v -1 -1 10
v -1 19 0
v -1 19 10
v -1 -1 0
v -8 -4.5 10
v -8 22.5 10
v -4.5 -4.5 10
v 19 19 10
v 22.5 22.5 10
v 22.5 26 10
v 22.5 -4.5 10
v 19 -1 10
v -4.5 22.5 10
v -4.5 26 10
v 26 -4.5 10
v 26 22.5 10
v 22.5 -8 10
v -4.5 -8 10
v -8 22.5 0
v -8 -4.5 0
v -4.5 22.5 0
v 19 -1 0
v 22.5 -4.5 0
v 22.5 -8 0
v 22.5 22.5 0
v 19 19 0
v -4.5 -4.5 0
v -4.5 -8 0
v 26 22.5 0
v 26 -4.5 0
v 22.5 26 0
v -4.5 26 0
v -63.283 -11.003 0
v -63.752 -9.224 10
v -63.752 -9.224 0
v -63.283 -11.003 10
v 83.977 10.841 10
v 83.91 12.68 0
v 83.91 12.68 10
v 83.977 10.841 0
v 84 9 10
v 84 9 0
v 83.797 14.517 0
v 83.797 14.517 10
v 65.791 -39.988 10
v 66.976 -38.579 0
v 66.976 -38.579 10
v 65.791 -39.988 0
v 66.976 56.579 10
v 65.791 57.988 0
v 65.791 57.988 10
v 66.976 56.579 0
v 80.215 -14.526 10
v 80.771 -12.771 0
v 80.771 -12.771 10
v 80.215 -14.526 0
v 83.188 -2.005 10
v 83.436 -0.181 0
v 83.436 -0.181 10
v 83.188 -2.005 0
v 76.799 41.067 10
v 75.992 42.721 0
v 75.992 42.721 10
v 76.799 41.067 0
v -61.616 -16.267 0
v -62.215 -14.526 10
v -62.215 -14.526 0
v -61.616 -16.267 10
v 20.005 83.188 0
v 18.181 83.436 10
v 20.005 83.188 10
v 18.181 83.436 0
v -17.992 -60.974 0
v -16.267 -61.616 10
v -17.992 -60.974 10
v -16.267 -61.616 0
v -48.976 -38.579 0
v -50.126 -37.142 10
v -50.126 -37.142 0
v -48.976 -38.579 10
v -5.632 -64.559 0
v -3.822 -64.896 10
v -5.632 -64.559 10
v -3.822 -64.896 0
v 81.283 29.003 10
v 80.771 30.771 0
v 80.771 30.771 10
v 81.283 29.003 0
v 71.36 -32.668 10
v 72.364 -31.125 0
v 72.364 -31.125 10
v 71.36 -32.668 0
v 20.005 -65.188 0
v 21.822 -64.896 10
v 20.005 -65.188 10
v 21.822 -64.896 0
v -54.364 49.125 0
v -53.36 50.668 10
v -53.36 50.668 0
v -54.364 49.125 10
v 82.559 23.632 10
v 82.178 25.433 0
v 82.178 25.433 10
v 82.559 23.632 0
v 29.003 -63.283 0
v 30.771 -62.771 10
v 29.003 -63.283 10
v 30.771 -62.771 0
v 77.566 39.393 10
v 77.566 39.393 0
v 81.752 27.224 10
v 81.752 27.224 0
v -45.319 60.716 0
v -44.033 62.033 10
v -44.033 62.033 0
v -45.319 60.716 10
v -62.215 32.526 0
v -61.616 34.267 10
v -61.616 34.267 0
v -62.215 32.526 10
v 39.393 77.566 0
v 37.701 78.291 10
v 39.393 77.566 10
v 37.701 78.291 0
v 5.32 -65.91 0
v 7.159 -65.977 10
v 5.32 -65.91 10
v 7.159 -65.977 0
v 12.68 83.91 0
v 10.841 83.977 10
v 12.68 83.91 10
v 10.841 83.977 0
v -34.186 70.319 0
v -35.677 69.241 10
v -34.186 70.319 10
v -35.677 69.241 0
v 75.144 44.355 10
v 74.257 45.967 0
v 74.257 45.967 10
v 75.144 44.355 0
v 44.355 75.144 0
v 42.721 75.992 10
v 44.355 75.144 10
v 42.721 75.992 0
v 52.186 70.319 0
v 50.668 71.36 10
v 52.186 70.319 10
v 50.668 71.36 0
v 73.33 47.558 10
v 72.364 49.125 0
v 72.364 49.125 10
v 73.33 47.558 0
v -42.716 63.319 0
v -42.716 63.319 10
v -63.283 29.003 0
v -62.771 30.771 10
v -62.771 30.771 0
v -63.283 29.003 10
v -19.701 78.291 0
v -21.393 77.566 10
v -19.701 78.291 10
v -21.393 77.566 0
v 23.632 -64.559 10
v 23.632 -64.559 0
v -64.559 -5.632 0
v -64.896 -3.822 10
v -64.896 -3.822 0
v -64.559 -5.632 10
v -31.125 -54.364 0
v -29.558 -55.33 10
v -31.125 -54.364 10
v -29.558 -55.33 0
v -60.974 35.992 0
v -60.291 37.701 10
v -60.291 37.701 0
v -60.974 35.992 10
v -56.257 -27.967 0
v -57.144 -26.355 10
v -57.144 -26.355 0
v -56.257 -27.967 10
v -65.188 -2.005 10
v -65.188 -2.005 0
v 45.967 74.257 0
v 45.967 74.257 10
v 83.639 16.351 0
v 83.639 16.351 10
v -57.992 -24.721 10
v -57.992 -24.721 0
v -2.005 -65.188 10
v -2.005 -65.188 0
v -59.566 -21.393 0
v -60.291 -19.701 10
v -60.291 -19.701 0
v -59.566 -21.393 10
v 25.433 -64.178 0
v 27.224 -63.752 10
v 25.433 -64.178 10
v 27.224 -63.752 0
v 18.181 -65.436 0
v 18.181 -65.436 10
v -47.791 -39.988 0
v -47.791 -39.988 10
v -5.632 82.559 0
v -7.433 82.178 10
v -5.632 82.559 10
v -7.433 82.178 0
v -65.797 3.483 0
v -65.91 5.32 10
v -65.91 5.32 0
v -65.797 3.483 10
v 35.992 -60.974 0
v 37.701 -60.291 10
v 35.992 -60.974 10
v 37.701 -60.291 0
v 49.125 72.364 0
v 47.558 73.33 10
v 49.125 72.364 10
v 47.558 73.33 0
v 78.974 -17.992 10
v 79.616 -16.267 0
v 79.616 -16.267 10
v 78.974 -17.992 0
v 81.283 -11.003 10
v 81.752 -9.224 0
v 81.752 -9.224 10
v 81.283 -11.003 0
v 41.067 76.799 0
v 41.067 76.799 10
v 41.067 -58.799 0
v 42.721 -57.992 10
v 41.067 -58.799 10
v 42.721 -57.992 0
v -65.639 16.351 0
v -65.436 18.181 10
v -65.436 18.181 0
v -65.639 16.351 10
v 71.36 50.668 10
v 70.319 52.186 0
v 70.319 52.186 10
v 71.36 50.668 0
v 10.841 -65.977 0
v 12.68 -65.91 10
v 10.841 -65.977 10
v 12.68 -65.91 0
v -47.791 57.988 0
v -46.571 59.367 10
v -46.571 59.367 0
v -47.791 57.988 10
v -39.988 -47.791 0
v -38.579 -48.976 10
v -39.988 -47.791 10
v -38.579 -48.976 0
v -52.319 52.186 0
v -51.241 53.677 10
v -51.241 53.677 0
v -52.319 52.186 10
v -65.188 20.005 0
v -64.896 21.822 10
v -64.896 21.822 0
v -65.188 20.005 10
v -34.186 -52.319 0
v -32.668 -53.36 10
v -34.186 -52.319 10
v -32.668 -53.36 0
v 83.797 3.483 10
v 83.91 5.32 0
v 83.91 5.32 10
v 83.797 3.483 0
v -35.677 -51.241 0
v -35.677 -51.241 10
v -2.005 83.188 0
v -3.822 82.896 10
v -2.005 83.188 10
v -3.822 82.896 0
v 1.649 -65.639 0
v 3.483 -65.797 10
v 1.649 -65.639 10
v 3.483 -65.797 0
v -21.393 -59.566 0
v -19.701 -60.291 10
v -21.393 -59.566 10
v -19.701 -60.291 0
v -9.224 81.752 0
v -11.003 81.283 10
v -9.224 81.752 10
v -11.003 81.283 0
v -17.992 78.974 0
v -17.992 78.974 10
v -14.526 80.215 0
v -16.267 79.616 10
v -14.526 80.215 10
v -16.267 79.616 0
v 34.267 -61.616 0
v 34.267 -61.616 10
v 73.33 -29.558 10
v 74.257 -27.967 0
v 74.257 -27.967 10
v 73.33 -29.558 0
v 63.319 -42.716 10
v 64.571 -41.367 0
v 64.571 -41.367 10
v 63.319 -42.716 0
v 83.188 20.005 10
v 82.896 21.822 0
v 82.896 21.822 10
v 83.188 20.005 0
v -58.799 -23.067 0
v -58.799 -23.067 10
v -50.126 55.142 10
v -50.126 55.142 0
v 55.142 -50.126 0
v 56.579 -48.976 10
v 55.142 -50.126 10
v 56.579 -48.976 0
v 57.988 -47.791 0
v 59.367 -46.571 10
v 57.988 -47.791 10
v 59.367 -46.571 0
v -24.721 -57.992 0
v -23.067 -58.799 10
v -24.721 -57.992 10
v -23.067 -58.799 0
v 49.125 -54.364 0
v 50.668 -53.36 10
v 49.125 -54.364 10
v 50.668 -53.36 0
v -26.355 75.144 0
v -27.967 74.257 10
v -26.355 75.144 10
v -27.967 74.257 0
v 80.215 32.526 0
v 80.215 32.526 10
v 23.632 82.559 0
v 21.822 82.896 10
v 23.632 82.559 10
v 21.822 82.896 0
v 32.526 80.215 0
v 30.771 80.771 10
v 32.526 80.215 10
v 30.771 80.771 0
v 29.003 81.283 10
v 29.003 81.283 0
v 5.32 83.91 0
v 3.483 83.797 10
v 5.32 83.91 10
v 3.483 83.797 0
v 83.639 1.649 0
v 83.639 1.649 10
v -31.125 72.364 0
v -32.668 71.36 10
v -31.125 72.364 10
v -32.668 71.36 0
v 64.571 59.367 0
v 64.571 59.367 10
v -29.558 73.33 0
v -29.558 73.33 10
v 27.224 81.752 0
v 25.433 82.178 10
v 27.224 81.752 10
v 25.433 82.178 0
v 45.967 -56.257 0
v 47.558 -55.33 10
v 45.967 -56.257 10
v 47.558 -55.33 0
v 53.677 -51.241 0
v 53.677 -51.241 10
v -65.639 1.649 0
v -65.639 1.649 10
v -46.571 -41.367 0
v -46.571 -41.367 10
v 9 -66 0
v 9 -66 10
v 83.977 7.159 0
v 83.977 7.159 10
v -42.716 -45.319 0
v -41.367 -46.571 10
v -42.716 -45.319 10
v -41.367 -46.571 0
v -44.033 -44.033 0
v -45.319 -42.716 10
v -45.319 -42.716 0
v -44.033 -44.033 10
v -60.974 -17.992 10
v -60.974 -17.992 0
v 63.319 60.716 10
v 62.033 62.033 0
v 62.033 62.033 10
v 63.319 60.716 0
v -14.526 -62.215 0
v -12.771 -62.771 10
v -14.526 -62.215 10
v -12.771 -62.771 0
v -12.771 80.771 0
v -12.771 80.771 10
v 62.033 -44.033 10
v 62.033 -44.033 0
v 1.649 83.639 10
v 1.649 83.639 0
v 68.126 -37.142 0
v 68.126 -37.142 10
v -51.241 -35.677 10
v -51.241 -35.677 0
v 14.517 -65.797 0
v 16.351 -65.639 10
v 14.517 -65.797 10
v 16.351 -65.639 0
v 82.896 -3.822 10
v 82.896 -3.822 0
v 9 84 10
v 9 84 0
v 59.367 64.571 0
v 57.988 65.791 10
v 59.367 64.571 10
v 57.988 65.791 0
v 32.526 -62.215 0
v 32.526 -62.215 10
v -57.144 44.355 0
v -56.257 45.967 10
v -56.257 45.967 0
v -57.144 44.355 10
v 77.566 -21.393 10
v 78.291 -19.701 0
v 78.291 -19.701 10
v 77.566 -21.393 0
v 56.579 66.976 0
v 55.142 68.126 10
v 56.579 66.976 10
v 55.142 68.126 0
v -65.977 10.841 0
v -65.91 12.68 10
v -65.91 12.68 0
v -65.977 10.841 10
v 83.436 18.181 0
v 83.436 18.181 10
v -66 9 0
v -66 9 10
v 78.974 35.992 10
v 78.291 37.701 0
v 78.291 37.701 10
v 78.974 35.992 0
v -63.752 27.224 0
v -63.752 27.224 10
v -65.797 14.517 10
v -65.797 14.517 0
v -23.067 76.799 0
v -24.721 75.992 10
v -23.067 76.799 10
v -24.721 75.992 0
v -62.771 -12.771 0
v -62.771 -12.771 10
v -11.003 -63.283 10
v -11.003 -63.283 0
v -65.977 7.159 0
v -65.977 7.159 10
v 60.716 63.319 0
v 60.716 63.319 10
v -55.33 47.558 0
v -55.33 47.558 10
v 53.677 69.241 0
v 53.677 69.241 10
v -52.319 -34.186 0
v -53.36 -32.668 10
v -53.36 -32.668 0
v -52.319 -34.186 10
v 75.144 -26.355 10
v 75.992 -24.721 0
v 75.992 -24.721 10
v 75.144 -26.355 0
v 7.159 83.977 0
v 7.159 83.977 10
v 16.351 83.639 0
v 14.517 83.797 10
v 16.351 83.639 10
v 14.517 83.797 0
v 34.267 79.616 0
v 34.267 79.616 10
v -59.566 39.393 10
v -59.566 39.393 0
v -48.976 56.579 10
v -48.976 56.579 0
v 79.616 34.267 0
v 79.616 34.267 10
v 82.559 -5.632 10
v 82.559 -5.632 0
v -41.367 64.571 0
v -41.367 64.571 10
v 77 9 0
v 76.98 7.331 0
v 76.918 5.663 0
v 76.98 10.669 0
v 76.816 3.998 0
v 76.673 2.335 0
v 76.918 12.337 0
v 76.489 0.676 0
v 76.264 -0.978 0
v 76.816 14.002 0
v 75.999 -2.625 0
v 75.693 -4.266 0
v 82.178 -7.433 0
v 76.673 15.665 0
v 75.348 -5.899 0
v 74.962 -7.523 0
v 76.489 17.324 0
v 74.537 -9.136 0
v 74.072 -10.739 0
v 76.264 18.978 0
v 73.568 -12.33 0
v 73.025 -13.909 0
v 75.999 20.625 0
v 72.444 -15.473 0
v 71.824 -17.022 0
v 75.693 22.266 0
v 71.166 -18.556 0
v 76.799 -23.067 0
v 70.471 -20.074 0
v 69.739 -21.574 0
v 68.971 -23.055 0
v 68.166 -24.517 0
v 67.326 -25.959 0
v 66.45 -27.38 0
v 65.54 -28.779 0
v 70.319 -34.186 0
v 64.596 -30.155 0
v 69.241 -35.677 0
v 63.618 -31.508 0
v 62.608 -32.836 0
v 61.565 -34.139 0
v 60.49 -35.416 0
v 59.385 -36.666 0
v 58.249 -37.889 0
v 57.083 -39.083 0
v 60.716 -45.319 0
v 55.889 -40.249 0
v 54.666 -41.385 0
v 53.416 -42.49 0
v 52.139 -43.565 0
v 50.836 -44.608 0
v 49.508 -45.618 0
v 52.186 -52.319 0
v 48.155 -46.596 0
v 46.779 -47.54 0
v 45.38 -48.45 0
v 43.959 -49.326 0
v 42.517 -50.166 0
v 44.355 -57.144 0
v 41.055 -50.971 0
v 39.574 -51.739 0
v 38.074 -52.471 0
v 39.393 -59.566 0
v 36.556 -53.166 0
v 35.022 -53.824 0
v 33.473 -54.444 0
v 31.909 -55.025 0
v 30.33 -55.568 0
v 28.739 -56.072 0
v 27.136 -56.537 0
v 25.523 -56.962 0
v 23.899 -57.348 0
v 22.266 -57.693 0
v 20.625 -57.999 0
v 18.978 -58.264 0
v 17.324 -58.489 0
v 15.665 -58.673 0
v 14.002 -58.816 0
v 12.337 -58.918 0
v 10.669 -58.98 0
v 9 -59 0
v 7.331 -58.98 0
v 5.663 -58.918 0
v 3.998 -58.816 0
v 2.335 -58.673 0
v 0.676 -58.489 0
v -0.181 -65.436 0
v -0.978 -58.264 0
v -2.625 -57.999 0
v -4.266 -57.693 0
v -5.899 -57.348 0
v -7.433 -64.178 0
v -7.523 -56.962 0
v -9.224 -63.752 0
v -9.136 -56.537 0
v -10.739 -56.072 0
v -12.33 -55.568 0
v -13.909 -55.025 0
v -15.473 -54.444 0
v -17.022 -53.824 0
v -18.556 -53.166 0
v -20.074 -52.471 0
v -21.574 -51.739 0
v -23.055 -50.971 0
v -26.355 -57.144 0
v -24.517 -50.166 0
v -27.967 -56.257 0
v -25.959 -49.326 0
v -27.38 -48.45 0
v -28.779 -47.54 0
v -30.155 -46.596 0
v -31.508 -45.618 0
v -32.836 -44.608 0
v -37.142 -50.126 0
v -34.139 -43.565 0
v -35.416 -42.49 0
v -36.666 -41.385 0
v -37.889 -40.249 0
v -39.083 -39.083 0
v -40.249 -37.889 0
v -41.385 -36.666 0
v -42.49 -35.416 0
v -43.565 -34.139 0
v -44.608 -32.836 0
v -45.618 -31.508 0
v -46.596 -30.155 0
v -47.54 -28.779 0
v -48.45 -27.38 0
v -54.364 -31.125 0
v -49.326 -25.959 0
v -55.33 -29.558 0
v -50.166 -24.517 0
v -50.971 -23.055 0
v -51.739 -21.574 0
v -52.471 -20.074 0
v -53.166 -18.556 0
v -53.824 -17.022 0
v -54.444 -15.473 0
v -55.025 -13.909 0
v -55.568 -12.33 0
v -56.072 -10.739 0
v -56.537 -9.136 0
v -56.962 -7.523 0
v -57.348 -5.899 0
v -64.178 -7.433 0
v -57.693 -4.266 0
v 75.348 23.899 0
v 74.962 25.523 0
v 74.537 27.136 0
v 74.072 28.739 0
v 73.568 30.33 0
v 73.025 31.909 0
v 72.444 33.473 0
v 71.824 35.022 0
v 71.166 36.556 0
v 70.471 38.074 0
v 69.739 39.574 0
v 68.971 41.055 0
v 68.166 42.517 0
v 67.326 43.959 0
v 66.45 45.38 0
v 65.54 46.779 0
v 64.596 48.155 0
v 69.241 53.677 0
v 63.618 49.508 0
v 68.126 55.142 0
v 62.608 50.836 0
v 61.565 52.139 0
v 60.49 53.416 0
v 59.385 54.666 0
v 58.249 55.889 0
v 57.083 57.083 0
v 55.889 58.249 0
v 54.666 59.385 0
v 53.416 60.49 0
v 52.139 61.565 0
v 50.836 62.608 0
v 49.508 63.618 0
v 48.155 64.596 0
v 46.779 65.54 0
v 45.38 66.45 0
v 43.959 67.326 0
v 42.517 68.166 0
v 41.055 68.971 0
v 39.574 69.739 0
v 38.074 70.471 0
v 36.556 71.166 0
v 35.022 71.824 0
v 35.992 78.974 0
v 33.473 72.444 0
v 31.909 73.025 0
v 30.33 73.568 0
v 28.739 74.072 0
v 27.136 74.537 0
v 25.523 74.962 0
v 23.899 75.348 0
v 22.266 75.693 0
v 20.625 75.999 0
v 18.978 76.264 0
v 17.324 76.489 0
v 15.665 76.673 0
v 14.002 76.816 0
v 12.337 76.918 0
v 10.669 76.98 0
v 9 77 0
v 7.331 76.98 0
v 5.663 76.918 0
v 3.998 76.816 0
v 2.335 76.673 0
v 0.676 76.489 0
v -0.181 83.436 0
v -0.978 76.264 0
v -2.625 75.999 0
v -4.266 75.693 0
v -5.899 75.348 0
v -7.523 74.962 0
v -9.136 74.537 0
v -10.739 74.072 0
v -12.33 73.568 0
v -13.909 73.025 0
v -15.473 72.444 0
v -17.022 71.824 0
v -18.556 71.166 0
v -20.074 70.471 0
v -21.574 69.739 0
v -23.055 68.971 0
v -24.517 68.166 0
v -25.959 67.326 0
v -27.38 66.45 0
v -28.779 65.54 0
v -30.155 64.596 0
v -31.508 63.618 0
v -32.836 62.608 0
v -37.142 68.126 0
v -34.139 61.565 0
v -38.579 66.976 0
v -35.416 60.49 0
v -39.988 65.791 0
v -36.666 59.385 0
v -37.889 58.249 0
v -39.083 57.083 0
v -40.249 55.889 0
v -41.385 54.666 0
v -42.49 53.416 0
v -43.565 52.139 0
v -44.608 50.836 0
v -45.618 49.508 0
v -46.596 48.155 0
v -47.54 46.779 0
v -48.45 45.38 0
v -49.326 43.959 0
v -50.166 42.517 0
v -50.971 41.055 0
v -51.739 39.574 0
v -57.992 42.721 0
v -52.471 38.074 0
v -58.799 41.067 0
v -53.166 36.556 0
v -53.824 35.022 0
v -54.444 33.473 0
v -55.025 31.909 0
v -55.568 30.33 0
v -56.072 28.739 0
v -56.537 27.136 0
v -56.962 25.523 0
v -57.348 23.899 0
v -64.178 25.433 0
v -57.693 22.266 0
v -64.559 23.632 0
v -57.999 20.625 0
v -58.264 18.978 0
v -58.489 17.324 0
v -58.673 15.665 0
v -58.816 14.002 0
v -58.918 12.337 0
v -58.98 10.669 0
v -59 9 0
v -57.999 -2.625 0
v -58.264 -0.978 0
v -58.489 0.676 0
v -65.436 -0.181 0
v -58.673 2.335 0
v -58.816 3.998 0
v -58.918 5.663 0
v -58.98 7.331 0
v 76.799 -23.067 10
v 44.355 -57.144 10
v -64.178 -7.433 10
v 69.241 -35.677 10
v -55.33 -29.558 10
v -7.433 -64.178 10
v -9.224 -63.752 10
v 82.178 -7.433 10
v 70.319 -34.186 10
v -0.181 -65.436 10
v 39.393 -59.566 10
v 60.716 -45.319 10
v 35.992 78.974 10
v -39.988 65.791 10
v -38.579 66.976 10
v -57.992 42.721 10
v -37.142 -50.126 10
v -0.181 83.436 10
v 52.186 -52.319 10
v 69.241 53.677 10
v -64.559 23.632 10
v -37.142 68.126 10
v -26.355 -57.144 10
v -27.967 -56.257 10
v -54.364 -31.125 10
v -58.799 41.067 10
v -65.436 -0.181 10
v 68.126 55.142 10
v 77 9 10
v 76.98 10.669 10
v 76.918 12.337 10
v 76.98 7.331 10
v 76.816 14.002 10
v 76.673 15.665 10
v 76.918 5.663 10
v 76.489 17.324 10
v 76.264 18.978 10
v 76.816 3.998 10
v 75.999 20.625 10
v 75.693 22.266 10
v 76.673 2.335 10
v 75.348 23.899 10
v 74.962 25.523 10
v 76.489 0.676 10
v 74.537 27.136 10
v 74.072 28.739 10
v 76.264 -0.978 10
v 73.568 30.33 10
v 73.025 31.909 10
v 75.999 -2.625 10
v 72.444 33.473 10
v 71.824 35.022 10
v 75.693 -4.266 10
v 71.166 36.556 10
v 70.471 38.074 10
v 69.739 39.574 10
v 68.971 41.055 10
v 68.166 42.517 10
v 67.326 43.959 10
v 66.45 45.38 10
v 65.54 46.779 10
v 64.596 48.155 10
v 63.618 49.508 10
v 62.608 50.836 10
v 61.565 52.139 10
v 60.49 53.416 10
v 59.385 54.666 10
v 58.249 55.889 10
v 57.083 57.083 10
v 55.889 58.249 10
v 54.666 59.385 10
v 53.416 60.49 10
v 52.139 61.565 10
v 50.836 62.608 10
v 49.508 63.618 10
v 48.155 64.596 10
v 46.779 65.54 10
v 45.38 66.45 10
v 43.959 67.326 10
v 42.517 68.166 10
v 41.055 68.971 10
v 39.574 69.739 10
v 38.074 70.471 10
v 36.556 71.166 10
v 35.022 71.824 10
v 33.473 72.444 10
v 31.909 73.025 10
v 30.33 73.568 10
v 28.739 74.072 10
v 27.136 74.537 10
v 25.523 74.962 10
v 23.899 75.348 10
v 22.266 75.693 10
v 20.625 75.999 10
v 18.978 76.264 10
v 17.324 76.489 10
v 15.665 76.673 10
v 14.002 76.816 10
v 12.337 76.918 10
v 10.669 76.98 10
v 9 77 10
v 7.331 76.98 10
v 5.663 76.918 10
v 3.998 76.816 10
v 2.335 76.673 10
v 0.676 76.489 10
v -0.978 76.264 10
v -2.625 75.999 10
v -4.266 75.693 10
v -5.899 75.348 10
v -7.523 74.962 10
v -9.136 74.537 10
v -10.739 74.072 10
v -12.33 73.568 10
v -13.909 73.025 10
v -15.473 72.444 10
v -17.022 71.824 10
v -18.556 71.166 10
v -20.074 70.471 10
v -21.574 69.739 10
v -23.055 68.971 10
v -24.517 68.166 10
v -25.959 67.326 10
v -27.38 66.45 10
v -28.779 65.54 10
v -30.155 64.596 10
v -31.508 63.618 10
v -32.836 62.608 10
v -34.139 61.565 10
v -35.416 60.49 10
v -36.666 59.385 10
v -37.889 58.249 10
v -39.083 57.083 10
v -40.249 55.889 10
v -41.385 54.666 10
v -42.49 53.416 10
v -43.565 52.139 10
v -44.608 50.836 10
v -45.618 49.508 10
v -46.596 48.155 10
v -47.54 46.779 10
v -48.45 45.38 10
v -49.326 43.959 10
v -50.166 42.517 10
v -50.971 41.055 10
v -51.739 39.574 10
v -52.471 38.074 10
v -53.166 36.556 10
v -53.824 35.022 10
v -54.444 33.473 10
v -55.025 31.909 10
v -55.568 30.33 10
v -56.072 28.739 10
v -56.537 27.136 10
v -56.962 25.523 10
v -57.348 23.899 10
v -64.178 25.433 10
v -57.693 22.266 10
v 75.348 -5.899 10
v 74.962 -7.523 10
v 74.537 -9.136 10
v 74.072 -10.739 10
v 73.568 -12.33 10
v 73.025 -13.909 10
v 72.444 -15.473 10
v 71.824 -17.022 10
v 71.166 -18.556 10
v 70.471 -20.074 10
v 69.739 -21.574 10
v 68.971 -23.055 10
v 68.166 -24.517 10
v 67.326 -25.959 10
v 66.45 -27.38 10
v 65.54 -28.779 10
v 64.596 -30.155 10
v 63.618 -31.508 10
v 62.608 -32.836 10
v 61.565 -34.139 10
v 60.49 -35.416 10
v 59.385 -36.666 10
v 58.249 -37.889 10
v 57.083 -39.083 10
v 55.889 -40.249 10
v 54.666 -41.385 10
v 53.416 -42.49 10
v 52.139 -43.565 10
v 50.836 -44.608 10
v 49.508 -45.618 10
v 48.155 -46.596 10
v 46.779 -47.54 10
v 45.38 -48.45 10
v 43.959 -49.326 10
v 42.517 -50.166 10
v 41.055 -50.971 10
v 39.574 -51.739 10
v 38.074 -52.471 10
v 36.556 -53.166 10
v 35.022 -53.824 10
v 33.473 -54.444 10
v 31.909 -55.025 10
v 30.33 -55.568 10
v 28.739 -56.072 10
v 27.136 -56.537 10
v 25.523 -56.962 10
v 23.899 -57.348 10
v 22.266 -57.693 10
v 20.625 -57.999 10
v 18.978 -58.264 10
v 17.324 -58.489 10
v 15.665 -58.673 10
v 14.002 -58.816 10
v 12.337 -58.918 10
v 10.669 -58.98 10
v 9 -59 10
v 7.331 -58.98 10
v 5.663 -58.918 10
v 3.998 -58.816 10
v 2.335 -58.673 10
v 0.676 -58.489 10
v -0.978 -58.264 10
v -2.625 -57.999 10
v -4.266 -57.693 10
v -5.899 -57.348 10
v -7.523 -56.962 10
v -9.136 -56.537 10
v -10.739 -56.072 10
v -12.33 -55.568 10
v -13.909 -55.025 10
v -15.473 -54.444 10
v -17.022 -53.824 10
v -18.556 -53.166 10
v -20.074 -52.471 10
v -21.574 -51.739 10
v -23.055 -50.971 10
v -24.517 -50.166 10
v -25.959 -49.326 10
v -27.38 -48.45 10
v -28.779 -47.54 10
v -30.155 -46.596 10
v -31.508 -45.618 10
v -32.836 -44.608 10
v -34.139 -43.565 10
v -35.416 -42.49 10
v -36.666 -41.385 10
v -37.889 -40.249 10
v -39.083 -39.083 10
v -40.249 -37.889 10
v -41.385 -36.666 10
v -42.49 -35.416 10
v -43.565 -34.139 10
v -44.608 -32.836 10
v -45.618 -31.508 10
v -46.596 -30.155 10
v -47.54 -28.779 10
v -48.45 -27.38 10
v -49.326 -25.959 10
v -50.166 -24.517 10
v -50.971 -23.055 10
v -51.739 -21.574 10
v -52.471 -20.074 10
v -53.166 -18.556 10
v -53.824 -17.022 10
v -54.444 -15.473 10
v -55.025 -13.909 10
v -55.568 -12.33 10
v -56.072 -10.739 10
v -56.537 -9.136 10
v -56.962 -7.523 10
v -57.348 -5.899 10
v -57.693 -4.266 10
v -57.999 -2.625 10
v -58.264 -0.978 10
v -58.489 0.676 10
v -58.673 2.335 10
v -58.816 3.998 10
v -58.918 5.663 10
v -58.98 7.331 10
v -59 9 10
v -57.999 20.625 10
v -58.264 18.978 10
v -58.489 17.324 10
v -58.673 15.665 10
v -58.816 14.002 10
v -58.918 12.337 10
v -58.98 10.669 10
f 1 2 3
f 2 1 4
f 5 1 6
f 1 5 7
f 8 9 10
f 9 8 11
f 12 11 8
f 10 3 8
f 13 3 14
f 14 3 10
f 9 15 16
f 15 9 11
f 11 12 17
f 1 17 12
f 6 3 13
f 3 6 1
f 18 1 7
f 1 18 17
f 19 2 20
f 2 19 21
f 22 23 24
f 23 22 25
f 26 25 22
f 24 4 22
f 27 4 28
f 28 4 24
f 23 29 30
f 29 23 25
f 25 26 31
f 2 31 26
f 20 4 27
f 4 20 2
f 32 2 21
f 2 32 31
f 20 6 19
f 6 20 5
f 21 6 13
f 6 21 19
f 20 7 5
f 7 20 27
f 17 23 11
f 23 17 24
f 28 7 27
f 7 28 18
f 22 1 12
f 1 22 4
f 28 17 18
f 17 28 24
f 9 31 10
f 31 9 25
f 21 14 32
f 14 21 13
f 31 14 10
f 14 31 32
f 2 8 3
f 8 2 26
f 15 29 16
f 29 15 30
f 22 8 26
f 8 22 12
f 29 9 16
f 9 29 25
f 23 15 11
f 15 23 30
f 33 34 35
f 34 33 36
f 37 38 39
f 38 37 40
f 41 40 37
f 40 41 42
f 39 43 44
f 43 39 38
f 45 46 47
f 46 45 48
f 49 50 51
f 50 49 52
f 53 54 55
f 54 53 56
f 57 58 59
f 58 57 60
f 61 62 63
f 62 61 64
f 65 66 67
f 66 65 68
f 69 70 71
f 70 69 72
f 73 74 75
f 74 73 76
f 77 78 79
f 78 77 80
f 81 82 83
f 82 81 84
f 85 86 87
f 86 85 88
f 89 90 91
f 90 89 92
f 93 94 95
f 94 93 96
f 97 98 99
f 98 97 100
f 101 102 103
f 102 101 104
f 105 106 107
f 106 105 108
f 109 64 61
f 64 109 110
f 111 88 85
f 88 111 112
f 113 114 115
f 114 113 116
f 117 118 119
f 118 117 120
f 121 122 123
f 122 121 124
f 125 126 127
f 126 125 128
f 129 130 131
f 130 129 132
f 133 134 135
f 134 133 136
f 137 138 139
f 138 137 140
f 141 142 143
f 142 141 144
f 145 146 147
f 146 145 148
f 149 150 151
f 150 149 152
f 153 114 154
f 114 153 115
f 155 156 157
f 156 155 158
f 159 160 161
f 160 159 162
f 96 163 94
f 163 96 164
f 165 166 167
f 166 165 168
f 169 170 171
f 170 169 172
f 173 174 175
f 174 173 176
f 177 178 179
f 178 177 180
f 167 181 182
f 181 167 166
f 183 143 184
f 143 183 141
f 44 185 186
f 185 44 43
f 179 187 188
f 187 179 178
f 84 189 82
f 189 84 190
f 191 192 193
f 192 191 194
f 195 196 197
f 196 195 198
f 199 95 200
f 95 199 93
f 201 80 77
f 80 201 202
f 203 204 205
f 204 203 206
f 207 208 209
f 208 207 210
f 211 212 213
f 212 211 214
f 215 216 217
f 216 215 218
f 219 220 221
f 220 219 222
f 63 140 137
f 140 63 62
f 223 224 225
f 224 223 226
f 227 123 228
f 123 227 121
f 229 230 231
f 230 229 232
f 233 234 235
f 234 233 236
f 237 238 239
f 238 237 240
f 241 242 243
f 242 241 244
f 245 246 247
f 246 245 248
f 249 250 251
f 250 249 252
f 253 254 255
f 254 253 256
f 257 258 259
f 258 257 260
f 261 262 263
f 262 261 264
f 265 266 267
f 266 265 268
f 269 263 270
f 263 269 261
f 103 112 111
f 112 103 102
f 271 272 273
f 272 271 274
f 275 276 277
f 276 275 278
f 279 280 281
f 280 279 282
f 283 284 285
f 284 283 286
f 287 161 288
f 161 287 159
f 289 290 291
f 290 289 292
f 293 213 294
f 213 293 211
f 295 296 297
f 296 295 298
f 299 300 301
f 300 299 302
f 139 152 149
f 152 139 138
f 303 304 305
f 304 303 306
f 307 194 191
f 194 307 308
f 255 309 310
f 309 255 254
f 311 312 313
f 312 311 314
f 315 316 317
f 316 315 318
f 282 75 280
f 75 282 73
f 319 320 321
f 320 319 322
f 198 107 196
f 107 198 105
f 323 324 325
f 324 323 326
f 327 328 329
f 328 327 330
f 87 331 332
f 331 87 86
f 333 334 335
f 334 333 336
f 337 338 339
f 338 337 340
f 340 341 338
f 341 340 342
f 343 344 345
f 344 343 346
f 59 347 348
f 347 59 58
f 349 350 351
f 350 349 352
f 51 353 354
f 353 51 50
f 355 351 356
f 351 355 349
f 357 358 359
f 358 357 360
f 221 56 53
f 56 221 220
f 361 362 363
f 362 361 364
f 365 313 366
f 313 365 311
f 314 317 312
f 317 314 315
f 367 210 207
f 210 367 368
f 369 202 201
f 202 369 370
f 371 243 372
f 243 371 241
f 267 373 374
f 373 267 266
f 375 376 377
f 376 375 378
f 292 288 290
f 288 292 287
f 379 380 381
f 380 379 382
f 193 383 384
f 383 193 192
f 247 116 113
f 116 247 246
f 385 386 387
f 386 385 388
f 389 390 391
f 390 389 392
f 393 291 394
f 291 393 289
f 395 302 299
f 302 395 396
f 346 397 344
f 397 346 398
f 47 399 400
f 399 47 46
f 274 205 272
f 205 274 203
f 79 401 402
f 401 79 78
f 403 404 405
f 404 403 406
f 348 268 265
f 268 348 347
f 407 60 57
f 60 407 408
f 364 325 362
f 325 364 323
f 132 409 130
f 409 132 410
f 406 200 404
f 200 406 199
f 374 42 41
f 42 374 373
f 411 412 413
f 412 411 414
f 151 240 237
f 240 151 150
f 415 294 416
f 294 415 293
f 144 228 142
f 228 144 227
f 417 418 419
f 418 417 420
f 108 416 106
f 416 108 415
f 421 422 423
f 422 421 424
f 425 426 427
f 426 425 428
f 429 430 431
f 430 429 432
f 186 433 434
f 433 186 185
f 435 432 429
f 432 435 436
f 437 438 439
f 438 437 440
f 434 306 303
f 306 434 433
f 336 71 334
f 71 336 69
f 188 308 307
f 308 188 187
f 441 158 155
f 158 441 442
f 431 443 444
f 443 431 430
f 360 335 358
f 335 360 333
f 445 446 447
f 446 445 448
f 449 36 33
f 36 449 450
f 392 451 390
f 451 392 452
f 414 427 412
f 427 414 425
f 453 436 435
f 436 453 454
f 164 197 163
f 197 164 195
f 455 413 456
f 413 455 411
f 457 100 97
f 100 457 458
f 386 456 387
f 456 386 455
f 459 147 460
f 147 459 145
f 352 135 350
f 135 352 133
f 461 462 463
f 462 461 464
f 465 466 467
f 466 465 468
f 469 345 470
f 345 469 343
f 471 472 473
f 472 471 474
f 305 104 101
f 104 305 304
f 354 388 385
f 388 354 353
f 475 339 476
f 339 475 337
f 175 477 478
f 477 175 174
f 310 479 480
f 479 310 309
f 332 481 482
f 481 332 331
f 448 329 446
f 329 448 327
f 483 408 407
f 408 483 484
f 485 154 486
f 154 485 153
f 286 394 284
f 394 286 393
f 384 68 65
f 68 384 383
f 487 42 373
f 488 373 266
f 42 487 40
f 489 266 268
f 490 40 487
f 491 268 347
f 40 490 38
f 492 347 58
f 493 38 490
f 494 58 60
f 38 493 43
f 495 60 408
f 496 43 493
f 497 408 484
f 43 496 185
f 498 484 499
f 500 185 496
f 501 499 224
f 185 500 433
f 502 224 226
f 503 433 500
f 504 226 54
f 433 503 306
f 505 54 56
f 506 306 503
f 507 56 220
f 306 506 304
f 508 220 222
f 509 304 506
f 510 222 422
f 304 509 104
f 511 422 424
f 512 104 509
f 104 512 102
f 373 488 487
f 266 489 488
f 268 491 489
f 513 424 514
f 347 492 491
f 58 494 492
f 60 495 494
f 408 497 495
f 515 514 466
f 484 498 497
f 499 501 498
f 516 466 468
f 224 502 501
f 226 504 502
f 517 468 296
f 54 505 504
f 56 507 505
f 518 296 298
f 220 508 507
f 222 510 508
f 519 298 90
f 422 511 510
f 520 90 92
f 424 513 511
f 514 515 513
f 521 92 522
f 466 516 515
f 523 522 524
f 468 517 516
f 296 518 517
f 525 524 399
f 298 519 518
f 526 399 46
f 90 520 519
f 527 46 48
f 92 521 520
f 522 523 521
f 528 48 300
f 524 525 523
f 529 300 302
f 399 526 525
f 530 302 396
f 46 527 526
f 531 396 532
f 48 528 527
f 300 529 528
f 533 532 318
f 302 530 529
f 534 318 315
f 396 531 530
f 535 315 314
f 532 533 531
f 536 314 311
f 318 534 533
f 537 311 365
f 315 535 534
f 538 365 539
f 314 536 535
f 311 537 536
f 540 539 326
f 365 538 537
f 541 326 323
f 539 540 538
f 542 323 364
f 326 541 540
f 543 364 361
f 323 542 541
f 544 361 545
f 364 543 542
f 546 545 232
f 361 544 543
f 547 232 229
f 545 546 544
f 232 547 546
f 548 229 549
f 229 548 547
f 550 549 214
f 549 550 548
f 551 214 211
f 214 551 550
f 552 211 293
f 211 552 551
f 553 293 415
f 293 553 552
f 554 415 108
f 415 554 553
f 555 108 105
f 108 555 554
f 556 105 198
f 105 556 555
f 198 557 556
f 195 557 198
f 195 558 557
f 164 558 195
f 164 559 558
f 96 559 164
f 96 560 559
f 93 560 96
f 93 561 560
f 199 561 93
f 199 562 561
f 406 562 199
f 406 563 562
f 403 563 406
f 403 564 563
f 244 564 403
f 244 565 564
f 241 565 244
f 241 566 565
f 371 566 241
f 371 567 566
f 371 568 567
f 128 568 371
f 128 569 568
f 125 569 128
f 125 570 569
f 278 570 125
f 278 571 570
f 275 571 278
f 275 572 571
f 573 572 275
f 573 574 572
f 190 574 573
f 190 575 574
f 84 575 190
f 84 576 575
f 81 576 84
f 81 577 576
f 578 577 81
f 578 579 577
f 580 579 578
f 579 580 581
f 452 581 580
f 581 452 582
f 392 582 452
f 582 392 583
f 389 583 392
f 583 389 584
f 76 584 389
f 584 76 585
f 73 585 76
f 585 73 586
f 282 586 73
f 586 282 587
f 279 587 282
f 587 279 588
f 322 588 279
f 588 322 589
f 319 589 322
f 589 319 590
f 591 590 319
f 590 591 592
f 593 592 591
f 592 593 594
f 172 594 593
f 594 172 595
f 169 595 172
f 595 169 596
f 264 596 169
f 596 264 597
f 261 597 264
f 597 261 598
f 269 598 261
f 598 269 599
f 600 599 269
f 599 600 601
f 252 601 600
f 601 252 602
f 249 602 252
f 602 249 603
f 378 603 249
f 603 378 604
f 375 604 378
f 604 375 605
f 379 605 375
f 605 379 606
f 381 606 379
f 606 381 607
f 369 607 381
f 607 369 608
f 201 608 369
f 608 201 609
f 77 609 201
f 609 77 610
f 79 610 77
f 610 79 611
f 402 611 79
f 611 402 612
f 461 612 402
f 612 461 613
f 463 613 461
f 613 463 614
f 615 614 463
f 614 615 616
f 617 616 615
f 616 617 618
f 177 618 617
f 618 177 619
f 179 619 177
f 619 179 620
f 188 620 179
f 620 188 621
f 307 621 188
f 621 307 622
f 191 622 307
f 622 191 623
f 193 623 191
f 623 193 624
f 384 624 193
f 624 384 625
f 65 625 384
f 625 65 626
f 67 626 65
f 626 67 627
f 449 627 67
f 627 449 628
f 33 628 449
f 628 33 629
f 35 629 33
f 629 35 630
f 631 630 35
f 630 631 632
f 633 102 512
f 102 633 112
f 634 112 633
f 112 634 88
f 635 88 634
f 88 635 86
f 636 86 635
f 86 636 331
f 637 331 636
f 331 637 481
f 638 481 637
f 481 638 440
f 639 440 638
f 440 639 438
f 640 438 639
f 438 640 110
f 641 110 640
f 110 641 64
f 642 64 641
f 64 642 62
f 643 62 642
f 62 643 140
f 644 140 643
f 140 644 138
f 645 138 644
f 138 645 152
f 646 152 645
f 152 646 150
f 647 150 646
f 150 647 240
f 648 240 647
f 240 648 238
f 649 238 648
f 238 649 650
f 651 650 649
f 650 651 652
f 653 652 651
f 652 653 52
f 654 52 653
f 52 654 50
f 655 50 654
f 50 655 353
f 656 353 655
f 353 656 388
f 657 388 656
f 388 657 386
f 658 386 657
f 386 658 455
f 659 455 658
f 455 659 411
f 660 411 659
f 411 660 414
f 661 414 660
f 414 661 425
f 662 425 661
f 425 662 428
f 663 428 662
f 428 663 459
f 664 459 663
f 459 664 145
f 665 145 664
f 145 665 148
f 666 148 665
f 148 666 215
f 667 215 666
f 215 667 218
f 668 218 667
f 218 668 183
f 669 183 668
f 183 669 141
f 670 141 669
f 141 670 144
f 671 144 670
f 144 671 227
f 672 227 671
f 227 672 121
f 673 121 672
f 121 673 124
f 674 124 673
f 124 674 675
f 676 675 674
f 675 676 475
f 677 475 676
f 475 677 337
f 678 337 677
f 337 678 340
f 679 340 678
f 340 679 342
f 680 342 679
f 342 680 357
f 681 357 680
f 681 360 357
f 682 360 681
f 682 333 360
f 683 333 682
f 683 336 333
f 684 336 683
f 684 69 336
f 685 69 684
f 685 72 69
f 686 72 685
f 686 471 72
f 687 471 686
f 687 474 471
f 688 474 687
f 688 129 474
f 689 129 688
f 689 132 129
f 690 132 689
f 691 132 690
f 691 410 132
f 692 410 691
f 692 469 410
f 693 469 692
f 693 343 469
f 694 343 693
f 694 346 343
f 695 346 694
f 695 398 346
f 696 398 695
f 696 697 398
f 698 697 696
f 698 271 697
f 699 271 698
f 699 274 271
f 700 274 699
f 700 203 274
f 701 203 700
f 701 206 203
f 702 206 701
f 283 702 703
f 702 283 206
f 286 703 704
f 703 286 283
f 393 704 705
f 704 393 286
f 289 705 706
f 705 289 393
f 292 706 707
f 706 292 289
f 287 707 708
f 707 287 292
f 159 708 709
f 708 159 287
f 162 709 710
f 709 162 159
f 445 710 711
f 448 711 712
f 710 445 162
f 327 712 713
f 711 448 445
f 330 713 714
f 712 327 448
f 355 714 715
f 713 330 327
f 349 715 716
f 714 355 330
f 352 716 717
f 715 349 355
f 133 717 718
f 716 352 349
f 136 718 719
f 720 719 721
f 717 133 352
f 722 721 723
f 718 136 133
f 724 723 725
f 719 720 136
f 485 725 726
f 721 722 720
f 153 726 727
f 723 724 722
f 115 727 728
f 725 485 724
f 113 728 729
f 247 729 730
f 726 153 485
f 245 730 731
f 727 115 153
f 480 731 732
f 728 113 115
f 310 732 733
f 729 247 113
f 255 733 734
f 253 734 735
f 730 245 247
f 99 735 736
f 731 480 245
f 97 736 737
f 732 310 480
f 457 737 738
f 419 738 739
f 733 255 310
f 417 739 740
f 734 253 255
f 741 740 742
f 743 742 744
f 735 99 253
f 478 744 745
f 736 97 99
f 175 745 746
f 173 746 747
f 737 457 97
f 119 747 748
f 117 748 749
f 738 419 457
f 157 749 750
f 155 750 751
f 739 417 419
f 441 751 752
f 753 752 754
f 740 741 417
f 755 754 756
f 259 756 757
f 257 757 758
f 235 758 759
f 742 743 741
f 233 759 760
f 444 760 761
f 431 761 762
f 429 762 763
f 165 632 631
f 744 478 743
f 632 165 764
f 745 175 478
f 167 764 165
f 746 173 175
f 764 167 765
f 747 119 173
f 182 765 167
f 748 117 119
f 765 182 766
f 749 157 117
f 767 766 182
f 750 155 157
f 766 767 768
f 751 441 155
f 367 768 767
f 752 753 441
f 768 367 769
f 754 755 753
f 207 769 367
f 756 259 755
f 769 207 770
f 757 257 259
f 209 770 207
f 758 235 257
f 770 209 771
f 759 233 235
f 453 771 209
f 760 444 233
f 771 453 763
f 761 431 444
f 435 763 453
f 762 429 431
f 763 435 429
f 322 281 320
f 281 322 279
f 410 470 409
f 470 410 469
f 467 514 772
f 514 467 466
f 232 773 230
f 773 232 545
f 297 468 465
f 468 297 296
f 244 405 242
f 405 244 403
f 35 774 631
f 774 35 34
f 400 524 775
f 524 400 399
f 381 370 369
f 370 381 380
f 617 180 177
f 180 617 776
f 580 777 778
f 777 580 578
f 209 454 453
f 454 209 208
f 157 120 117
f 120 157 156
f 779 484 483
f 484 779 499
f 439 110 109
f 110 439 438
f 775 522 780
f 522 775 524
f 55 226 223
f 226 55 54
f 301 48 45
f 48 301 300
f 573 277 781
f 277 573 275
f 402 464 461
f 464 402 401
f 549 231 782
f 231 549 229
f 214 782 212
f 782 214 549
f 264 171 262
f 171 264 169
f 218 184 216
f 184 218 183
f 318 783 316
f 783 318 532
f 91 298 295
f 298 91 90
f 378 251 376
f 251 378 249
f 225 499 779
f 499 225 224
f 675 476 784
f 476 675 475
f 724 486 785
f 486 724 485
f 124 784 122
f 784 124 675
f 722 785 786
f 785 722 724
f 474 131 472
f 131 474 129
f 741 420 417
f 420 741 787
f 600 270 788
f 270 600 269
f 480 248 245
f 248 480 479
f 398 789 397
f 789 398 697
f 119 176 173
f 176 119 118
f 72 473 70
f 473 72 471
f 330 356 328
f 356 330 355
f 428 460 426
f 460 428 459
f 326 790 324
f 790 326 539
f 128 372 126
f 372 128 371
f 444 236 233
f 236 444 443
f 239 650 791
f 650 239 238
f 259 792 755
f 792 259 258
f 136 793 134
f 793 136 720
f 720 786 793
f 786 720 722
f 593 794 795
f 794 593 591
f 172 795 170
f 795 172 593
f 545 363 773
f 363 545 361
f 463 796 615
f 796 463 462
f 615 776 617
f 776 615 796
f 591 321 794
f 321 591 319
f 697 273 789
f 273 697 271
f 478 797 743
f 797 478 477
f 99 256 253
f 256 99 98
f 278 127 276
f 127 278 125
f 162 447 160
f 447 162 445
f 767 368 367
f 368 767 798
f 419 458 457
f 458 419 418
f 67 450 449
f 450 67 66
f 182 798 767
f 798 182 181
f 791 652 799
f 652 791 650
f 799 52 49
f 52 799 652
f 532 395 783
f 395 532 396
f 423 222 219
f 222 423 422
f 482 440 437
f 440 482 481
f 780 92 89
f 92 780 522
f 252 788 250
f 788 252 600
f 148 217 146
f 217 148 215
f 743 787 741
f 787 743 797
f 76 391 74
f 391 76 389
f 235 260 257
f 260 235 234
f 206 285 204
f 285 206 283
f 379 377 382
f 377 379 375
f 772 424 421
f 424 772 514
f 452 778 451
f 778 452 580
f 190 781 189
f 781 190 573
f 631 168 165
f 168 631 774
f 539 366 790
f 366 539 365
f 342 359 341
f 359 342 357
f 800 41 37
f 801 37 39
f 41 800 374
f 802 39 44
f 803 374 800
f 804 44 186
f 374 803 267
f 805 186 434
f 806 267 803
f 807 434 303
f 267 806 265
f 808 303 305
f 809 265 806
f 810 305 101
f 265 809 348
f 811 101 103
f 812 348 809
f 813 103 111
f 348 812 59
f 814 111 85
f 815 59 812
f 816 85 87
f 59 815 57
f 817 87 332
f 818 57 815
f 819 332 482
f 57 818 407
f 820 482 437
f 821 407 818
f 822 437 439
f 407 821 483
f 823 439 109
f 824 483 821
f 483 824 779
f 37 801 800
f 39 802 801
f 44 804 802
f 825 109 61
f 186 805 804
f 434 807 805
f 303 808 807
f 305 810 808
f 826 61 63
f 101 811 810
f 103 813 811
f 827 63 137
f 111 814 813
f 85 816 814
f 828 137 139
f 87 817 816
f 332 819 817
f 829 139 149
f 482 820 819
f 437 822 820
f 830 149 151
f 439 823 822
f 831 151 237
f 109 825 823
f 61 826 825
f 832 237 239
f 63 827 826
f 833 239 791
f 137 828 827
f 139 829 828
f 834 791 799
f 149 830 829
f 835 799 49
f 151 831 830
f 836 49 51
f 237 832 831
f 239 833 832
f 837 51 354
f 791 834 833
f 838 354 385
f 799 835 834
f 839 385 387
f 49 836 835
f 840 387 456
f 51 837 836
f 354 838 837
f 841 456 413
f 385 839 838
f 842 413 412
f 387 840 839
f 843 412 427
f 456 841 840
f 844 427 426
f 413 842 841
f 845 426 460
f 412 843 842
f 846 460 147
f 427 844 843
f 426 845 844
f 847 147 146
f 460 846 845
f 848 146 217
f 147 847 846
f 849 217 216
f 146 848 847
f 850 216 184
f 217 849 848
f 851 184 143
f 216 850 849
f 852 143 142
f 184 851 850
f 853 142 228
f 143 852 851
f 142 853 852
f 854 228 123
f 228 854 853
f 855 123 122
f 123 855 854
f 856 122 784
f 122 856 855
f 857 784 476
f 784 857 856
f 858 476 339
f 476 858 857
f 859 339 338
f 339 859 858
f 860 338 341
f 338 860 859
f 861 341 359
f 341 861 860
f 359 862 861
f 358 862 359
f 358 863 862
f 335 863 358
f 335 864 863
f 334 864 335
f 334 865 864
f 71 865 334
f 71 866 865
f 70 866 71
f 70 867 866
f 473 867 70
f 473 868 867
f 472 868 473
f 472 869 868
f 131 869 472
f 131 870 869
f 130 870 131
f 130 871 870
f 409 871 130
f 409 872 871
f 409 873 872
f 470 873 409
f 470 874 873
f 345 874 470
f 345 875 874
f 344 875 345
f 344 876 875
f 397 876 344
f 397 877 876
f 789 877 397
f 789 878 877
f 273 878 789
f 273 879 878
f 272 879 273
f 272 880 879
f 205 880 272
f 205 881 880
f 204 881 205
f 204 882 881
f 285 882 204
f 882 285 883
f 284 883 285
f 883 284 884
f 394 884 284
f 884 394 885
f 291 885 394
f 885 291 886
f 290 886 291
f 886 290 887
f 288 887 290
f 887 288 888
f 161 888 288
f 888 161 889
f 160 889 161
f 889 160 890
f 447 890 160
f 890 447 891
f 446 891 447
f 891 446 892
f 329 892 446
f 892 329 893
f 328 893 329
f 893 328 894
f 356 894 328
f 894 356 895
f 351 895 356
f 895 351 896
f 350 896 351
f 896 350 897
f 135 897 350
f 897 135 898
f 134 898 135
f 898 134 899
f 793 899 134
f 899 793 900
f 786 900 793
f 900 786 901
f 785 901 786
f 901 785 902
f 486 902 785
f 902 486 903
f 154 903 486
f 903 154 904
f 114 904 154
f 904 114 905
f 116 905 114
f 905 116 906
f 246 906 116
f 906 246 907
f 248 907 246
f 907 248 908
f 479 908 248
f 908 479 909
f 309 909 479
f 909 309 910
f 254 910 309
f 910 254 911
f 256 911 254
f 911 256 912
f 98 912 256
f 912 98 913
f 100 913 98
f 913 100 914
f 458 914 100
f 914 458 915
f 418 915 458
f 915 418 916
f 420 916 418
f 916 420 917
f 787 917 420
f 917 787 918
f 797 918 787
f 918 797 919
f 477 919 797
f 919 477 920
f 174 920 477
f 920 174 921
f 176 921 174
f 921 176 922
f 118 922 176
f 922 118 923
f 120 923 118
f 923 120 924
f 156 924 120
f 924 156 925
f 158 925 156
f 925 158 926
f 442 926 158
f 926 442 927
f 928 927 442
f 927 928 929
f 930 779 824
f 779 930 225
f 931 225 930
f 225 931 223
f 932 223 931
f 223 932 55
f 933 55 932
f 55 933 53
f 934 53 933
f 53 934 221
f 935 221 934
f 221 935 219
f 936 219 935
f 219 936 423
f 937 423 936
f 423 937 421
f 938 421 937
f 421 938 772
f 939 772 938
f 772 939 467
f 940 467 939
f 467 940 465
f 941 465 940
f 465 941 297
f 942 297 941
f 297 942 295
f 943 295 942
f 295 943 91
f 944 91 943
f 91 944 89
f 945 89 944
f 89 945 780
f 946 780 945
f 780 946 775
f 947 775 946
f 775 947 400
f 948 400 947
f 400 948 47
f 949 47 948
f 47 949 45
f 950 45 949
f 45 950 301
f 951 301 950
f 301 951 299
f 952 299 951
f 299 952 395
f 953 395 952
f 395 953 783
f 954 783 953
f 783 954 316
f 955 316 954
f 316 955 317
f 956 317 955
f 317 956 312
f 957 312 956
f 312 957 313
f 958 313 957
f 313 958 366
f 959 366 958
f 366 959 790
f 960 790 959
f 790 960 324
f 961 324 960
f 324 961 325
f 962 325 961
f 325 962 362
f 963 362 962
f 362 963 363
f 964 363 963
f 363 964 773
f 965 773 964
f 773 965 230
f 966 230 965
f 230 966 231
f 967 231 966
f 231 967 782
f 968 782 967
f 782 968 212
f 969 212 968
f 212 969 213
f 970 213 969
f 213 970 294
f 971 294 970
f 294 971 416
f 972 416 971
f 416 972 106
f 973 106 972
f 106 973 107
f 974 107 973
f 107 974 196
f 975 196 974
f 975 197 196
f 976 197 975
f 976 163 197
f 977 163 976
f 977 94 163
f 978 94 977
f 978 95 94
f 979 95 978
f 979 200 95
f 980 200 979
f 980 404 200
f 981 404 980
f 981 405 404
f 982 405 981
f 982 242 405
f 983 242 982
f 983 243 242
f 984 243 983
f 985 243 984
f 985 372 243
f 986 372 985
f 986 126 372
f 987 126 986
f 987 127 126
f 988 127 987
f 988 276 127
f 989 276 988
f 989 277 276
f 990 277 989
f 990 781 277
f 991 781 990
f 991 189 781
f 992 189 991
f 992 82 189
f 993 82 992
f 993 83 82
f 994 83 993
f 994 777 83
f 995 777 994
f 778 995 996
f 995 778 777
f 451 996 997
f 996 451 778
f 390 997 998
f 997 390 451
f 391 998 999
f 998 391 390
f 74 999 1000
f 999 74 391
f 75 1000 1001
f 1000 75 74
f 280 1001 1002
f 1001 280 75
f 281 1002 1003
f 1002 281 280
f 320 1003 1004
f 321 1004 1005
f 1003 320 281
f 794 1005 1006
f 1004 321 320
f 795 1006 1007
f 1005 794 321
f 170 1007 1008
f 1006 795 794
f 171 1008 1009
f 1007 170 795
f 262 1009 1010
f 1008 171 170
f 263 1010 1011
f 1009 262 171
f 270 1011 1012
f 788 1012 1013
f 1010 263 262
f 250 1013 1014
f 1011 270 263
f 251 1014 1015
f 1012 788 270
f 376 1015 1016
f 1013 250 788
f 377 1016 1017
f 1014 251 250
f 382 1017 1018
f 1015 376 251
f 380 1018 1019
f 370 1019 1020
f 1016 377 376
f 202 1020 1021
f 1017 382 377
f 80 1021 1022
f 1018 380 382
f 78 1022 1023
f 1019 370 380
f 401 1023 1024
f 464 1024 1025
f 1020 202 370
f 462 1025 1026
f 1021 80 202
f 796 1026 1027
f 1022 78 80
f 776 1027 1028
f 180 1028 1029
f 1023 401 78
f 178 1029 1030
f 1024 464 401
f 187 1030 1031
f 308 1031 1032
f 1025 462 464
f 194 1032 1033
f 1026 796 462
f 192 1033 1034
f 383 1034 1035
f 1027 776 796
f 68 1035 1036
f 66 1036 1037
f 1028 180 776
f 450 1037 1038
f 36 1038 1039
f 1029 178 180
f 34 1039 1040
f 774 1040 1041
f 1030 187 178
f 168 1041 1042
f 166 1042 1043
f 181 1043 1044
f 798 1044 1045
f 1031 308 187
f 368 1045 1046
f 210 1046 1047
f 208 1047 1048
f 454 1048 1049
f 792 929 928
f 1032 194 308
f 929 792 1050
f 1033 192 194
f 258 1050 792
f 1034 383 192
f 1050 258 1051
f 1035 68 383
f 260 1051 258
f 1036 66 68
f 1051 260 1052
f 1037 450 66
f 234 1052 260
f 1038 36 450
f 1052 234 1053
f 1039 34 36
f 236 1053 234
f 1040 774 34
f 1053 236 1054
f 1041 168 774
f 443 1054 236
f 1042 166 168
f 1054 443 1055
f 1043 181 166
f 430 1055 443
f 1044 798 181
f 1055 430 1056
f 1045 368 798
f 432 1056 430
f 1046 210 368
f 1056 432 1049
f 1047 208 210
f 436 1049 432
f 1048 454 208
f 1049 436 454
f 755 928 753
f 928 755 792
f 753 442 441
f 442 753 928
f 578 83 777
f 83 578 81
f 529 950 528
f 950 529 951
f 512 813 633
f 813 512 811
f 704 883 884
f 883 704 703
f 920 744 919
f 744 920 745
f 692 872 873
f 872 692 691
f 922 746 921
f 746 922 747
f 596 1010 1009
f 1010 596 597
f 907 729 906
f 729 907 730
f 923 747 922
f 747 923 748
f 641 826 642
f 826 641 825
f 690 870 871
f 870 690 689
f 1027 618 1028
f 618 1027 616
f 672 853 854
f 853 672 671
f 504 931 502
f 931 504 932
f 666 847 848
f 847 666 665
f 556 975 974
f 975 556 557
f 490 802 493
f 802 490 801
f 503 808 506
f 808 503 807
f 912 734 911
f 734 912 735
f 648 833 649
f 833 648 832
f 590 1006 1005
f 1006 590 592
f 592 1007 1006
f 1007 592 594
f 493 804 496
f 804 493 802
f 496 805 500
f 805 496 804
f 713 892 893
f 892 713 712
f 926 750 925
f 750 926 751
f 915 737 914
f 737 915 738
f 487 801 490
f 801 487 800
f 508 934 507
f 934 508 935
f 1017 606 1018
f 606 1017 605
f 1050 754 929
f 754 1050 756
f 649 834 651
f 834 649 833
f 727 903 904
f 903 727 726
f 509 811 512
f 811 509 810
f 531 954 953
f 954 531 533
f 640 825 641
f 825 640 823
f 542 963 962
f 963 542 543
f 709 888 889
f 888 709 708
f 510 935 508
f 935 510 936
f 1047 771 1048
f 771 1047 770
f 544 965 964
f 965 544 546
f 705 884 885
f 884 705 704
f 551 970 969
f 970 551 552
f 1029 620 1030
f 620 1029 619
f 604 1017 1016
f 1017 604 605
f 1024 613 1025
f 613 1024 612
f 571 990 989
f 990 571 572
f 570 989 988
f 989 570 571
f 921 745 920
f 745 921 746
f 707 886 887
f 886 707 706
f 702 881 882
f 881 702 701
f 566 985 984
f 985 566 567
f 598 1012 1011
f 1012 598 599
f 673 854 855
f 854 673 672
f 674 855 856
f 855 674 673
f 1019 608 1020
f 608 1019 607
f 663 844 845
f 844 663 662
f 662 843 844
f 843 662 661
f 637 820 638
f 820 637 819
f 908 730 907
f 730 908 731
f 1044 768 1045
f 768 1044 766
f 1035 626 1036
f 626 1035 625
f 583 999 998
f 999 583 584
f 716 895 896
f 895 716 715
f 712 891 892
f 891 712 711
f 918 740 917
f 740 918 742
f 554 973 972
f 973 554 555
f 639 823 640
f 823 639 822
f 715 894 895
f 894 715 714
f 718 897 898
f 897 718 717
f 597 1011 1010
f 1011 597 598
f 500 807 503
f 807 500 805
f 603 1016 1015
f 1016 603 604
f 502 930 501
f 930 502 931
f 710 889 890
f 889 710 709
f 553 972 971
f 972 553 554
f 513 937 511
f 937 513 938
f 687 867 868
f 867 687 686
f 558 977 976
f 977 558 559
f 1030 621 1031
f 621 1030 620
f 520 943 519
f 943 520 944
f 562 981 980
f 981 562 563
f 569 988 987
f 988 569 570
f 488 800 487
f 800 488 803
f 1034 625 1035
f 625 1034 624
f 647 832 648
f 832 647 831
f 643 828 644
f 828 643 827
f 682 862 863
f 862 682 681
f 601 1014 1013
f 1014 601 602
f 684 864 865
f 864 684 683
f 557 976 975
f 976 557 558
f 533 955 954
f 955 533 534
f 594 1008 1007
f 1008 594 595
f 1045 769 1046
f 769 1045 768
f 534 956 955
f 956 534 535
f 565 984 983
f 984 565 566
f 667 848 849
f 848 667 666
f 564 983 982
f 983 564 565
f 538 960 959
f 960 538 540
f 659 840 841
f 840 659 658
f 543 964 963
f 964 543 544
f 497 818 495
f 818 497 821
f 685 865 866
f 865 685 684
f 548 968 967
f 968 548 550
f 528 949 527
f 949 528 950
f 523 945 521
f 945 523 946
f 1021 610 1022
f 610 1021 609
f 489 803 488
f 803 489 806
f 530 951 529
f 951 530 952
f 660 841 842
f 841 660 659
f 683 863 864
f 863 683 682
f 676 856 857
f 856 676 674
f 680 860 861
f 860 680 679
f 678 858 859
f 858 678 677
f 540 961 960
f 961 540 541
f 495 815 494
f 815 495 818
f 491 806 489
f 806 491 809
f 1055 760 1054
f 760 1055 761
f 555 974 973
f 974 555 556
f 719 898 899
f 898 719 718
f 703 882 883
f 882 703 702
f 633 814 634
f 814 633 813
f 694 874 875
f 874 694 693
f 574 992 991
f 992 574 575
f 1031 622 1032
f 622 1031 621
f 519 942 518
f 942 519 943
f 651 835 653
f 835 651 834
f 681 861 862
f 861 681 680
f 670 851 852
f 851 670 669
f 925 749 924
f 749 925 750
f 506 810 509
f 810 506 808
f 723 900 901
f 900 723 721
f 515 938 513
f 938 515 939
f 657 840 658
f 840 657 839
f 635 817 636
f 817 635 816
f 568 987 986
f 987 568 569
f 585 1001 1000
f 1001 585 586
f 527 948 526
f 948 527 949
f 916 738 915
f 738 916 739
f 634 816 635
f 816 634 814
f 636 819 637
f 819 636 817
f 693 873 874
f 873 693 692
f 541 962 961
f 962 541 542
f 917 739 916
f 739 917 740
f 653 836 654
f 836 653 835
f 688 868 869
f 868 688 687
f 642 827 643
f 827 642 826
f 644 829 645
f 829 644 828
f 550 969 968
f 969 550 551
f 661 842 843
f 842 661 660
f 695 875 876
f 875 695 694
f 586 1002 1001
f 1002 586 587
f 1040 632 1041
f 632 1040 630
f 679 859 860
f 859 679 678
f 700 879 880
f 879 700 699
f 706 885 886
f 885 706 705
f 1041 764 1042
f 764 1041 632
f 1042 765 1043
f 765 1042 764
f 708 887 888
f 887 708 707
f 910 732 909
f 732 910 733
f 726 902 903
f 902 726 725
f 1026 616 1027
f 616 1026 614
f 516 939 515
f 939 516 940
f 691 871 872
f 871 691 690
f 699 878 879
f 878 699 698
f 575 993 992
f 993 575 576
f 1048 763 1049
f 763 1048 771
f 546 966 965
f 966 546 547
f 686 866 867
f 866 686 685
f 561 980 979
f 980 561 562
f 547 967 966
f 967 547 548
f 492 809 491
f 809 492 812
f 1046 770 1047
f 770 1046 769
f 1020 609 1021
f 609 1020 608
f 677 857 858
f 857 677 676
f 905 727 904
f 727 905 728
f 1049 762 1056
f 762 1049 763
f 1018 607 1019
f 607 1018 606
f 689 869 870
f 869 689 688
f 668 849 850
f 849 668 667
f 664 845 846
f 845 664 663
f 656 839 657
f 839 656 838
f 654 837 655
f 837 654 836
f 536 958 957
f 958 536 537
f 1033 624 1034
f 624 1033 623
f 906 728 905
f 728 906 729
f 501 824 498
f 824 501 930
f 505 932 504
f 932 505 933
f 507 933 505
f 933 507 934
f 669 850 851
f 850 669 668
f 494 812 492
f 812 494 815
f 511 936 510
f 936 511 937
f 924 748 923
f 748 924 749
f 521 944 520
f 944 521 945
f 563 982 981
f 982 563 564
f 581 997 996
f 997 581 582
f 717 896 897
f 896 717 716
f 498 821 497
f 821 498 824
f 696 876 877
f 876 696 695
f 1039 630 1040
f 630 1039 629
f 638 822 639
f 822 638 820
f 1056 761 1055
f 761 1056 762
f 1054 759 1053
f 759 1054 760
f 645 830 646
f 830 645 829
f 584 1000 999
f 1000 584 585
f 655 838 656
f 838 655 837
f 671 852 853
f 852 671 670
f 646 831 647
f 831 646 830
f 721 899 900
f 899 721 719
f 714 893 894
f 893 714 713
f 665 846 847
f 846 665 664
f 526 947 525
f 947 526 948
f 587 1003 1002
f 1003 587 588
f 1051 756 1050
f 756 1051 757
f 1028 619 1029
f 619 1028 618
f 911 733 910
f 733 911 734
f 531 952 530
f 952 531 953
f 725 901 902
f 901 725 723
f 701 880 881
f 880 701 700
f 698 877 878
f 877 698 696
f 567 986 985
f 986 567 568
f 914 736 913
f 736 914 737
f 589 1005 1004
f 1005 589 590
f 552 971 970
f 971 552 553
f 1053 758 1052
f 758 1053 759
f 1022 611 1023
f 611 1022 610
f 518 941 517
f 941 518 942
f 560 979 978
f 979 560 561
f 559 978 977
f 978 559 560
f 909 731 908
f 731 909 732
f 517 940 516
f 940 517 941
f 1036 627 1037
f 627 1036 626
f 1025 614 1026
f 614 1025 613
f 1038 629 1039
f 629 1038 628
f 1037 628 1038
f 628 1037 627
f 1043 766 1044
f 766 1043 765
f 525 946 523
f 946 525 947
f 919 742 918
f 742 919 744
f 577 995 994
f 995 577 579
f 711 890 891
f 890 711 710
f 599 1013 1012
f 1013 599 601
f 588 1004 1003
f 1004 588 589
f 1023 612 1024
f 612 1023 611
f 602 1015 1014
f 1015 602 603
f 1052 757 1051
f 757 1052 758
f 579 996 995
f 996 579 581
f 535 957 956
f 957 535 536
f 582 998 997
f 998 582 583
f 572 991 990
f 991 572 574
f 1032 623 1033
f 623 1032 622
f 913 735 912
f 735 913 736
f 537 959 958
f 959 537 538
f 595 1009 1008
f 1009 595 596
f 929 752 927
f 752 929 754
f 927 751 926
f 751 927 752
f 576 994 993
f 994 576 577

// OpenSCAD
// Generated by SolidPython 1.1.3 on 2026-06-23 12:54:52


union() {
	union() {
		translate(v = [-4.5000000000, 9.0000000000, 5.0000000000]) {
			cube(center = true, size = [7, 27, 10]);
		}
		translate(v = [9.0000000000, -4.5000000000, 5.0000000000]) {
			cube(center = true, size = [27, 7, 10]);
		}
		translate(v = [0, 27]) {
			translate(v = [9.0000000000, -4.5000000000, 5.0000000000]) {
				cube(center = true, size = [27, 7, 10]);
			}
		}
		translate(v = [27, 0]) {
			translate(v = [-4.5000000000, 9.0000000000, 5.0000000000]) {
				cube(center = true, size = [7, 27, 10]);
			}
		}
	}
	translate(v = [9.0000000000, 9.0000000000]) {
		difference() {
			cylinder($fn = 256, h = 10, r = 75.0000000000);
			cylinder($fn = 256, h = 10, r = 68.0000000000);
		}
	}
}
/***********************************************
*********      SolidPython code:      **********
************************************************

"""SCAD file export functions.

This module provides functions for exporting OpenSCAD geometries to .scad files.
"""

from typing import Dict, Optional
from pathlib import Path
import solid

from .config import ExportConfiguration, FileNamingConfig


def export_scad(
    geometry: solid.OpenSCADObject, output_path: Path, header: Optional[str] = None
) -> Path:
    """Export geometry to SCAD file.

    Parameters
    ----------
    geometry : solid.OpenSCADObject
        Geometry to export.
    output_path : Path
        Output file path.
    header : str, optional
        Header comment to add to SCAD file.

    Returns
    -------
    Path
        Path to created SCAD file.

    Raises
    ------
    IOError
        If file cannot be written.

    Examples
    --------
    >>> from pathlib import Path
    >>> import solid
    >>>
    >>> geometry = solid.cube([10, 10, 10])
    >>> output_path = Path('output/device.scad')
    >>> export_scad(geometry, output_path)
    """
    # Ensure parent directory exists
    output_path.parent.mkdir(parents=True, exist_ok=True)

    # Render to file
    try:
        solid.scad_render_to_file(geometry, str(output_path))
    except Exception as e:
        raise IOError(f"Failed to write SCAD file to {output_path}: {e}")

    _normalize_scad_file(output_path)

    # Add header if provided
    if header:
        _add_header_to_scad(output_path, header)
        _normalize_scad_file(output_path)

    return output_path


def _normalize_scad_file(scad_path: Path) -> None:
    """Strip trailing whitespace from generated SCAD text."""
    content = scad_path.read_text()
    normalized = "\n".join(line.rstrip() for line in content.splitlines()) + "\n"
    if normalized != content:
        scad_path.write_text(normalized)


def export_multiple_scad(
    geometries: Dict[str, solid.OpenSCADObject],
    config: ExportConfiguration,
    naming_config: Optional[FileNamingConfig] = None,
) -> Dict[str, Path]:
    """Export multiple geometries to SCAD files.

    Parameters
    ----------
    geometries : dict
        Dictionary mapping prefixes to geometries.
        Keys are used as filename prefixes.
    config : ExportConfiguration
        Export configuration.
    naming_config : FileNamingConfig, optional
        File naming configuration.

    Returns
    -------
    dict
        Dictionary mapping prefixes to output paths.

    Examples
    --------
    >>> geometries = {
    ...     'wells': wells_geometry,
    ...     'channels': channels_geometry,
    ...     'device': device_geometry
    ... }
    >>> config = ExportConfiguration(output_directory=Path('output'))
    >>> paths = export_multiple_scad(geometries, config)
    """
    output_paths = {}

    for prefix, geometry in geometries.items():
        # Create naming config for this geometry
        if naming_config:
            file_config = FileNamingConfig(
                prefix=prefix,
                version=naming_config.version,
                grid_size=naming_config.grid_size,
                suffix=naming_config.suffix,
            )
        else:
            file_config = FileNamingConfig(prefix=prefix)

        # Generate filename
        filename = file_config.generate_filename("scad")
        output_path = config.get_output_path(filename)

        # Export
        export_scad(geometry, output_path)
        output_paths[prefix] = output_path

    return output_paths


def _add_header_to_scad(scad_path: Path, header: str):
    """Add header comment to existing SCAD file.

    Parameters
    ----------
    scad_path : Path
        Path to SCAD file.
    header : str
        Header text to add.
    """
    # Read existing content
    with open(scad_path, "r") as f:
        content = f.read()

    # Prepend header
    header_comment = f"// {header}\n\n"
    with open(scad_path, "w") as f:
        f.write(header_comment + content)


def generate_scad_header(
    device_name: str, version: Optional[str] = None, description: Optional[str] = None
) -> str:
    """Generate SCAD file header comment.

    Parameters
    ----------
    device_name : str
        Device name.
    version : str, optional
        Version string.
    description : str, optional
        Device description.

    Returns
    -------
    str
        Header comment text.

    Examples
    --------
    >>> header = generate_scad_header(
    ...     'Two Compartment Device',
    ...     version='v1',
    ...     description='96-well format with microchannels'
    ... )
    """
    lines = []
    lines.append("=" * 60)
    lines.append(f"Device: {device_name}")

    if version:
        lines.append(f"Version: {version}")

    if description:
        lines.append(f"Description: {description}")

    lines.append("Generated by OpenMFD")
    lines.append("=" * 60)

    return "\n".join(lines)


def validate_scad_file(scad_path: Path) -> bool:
    """Validate that SCAD file exists and is readable.

    Parameters
    ----------
    scad_path : Path
        Path to SCAD file.

    Returns
    -------
    bool
        True if file is valid, False otherwise.
    """
    if not scad_path.exists():
        return False

    if not scad_path.is_file():
        return False

    # Try to read file
    try:
        with open(scad_path, "r") as f:
            content = f.read()
        return len(content) > 0
    except Exception:
        return False


************************************************/
